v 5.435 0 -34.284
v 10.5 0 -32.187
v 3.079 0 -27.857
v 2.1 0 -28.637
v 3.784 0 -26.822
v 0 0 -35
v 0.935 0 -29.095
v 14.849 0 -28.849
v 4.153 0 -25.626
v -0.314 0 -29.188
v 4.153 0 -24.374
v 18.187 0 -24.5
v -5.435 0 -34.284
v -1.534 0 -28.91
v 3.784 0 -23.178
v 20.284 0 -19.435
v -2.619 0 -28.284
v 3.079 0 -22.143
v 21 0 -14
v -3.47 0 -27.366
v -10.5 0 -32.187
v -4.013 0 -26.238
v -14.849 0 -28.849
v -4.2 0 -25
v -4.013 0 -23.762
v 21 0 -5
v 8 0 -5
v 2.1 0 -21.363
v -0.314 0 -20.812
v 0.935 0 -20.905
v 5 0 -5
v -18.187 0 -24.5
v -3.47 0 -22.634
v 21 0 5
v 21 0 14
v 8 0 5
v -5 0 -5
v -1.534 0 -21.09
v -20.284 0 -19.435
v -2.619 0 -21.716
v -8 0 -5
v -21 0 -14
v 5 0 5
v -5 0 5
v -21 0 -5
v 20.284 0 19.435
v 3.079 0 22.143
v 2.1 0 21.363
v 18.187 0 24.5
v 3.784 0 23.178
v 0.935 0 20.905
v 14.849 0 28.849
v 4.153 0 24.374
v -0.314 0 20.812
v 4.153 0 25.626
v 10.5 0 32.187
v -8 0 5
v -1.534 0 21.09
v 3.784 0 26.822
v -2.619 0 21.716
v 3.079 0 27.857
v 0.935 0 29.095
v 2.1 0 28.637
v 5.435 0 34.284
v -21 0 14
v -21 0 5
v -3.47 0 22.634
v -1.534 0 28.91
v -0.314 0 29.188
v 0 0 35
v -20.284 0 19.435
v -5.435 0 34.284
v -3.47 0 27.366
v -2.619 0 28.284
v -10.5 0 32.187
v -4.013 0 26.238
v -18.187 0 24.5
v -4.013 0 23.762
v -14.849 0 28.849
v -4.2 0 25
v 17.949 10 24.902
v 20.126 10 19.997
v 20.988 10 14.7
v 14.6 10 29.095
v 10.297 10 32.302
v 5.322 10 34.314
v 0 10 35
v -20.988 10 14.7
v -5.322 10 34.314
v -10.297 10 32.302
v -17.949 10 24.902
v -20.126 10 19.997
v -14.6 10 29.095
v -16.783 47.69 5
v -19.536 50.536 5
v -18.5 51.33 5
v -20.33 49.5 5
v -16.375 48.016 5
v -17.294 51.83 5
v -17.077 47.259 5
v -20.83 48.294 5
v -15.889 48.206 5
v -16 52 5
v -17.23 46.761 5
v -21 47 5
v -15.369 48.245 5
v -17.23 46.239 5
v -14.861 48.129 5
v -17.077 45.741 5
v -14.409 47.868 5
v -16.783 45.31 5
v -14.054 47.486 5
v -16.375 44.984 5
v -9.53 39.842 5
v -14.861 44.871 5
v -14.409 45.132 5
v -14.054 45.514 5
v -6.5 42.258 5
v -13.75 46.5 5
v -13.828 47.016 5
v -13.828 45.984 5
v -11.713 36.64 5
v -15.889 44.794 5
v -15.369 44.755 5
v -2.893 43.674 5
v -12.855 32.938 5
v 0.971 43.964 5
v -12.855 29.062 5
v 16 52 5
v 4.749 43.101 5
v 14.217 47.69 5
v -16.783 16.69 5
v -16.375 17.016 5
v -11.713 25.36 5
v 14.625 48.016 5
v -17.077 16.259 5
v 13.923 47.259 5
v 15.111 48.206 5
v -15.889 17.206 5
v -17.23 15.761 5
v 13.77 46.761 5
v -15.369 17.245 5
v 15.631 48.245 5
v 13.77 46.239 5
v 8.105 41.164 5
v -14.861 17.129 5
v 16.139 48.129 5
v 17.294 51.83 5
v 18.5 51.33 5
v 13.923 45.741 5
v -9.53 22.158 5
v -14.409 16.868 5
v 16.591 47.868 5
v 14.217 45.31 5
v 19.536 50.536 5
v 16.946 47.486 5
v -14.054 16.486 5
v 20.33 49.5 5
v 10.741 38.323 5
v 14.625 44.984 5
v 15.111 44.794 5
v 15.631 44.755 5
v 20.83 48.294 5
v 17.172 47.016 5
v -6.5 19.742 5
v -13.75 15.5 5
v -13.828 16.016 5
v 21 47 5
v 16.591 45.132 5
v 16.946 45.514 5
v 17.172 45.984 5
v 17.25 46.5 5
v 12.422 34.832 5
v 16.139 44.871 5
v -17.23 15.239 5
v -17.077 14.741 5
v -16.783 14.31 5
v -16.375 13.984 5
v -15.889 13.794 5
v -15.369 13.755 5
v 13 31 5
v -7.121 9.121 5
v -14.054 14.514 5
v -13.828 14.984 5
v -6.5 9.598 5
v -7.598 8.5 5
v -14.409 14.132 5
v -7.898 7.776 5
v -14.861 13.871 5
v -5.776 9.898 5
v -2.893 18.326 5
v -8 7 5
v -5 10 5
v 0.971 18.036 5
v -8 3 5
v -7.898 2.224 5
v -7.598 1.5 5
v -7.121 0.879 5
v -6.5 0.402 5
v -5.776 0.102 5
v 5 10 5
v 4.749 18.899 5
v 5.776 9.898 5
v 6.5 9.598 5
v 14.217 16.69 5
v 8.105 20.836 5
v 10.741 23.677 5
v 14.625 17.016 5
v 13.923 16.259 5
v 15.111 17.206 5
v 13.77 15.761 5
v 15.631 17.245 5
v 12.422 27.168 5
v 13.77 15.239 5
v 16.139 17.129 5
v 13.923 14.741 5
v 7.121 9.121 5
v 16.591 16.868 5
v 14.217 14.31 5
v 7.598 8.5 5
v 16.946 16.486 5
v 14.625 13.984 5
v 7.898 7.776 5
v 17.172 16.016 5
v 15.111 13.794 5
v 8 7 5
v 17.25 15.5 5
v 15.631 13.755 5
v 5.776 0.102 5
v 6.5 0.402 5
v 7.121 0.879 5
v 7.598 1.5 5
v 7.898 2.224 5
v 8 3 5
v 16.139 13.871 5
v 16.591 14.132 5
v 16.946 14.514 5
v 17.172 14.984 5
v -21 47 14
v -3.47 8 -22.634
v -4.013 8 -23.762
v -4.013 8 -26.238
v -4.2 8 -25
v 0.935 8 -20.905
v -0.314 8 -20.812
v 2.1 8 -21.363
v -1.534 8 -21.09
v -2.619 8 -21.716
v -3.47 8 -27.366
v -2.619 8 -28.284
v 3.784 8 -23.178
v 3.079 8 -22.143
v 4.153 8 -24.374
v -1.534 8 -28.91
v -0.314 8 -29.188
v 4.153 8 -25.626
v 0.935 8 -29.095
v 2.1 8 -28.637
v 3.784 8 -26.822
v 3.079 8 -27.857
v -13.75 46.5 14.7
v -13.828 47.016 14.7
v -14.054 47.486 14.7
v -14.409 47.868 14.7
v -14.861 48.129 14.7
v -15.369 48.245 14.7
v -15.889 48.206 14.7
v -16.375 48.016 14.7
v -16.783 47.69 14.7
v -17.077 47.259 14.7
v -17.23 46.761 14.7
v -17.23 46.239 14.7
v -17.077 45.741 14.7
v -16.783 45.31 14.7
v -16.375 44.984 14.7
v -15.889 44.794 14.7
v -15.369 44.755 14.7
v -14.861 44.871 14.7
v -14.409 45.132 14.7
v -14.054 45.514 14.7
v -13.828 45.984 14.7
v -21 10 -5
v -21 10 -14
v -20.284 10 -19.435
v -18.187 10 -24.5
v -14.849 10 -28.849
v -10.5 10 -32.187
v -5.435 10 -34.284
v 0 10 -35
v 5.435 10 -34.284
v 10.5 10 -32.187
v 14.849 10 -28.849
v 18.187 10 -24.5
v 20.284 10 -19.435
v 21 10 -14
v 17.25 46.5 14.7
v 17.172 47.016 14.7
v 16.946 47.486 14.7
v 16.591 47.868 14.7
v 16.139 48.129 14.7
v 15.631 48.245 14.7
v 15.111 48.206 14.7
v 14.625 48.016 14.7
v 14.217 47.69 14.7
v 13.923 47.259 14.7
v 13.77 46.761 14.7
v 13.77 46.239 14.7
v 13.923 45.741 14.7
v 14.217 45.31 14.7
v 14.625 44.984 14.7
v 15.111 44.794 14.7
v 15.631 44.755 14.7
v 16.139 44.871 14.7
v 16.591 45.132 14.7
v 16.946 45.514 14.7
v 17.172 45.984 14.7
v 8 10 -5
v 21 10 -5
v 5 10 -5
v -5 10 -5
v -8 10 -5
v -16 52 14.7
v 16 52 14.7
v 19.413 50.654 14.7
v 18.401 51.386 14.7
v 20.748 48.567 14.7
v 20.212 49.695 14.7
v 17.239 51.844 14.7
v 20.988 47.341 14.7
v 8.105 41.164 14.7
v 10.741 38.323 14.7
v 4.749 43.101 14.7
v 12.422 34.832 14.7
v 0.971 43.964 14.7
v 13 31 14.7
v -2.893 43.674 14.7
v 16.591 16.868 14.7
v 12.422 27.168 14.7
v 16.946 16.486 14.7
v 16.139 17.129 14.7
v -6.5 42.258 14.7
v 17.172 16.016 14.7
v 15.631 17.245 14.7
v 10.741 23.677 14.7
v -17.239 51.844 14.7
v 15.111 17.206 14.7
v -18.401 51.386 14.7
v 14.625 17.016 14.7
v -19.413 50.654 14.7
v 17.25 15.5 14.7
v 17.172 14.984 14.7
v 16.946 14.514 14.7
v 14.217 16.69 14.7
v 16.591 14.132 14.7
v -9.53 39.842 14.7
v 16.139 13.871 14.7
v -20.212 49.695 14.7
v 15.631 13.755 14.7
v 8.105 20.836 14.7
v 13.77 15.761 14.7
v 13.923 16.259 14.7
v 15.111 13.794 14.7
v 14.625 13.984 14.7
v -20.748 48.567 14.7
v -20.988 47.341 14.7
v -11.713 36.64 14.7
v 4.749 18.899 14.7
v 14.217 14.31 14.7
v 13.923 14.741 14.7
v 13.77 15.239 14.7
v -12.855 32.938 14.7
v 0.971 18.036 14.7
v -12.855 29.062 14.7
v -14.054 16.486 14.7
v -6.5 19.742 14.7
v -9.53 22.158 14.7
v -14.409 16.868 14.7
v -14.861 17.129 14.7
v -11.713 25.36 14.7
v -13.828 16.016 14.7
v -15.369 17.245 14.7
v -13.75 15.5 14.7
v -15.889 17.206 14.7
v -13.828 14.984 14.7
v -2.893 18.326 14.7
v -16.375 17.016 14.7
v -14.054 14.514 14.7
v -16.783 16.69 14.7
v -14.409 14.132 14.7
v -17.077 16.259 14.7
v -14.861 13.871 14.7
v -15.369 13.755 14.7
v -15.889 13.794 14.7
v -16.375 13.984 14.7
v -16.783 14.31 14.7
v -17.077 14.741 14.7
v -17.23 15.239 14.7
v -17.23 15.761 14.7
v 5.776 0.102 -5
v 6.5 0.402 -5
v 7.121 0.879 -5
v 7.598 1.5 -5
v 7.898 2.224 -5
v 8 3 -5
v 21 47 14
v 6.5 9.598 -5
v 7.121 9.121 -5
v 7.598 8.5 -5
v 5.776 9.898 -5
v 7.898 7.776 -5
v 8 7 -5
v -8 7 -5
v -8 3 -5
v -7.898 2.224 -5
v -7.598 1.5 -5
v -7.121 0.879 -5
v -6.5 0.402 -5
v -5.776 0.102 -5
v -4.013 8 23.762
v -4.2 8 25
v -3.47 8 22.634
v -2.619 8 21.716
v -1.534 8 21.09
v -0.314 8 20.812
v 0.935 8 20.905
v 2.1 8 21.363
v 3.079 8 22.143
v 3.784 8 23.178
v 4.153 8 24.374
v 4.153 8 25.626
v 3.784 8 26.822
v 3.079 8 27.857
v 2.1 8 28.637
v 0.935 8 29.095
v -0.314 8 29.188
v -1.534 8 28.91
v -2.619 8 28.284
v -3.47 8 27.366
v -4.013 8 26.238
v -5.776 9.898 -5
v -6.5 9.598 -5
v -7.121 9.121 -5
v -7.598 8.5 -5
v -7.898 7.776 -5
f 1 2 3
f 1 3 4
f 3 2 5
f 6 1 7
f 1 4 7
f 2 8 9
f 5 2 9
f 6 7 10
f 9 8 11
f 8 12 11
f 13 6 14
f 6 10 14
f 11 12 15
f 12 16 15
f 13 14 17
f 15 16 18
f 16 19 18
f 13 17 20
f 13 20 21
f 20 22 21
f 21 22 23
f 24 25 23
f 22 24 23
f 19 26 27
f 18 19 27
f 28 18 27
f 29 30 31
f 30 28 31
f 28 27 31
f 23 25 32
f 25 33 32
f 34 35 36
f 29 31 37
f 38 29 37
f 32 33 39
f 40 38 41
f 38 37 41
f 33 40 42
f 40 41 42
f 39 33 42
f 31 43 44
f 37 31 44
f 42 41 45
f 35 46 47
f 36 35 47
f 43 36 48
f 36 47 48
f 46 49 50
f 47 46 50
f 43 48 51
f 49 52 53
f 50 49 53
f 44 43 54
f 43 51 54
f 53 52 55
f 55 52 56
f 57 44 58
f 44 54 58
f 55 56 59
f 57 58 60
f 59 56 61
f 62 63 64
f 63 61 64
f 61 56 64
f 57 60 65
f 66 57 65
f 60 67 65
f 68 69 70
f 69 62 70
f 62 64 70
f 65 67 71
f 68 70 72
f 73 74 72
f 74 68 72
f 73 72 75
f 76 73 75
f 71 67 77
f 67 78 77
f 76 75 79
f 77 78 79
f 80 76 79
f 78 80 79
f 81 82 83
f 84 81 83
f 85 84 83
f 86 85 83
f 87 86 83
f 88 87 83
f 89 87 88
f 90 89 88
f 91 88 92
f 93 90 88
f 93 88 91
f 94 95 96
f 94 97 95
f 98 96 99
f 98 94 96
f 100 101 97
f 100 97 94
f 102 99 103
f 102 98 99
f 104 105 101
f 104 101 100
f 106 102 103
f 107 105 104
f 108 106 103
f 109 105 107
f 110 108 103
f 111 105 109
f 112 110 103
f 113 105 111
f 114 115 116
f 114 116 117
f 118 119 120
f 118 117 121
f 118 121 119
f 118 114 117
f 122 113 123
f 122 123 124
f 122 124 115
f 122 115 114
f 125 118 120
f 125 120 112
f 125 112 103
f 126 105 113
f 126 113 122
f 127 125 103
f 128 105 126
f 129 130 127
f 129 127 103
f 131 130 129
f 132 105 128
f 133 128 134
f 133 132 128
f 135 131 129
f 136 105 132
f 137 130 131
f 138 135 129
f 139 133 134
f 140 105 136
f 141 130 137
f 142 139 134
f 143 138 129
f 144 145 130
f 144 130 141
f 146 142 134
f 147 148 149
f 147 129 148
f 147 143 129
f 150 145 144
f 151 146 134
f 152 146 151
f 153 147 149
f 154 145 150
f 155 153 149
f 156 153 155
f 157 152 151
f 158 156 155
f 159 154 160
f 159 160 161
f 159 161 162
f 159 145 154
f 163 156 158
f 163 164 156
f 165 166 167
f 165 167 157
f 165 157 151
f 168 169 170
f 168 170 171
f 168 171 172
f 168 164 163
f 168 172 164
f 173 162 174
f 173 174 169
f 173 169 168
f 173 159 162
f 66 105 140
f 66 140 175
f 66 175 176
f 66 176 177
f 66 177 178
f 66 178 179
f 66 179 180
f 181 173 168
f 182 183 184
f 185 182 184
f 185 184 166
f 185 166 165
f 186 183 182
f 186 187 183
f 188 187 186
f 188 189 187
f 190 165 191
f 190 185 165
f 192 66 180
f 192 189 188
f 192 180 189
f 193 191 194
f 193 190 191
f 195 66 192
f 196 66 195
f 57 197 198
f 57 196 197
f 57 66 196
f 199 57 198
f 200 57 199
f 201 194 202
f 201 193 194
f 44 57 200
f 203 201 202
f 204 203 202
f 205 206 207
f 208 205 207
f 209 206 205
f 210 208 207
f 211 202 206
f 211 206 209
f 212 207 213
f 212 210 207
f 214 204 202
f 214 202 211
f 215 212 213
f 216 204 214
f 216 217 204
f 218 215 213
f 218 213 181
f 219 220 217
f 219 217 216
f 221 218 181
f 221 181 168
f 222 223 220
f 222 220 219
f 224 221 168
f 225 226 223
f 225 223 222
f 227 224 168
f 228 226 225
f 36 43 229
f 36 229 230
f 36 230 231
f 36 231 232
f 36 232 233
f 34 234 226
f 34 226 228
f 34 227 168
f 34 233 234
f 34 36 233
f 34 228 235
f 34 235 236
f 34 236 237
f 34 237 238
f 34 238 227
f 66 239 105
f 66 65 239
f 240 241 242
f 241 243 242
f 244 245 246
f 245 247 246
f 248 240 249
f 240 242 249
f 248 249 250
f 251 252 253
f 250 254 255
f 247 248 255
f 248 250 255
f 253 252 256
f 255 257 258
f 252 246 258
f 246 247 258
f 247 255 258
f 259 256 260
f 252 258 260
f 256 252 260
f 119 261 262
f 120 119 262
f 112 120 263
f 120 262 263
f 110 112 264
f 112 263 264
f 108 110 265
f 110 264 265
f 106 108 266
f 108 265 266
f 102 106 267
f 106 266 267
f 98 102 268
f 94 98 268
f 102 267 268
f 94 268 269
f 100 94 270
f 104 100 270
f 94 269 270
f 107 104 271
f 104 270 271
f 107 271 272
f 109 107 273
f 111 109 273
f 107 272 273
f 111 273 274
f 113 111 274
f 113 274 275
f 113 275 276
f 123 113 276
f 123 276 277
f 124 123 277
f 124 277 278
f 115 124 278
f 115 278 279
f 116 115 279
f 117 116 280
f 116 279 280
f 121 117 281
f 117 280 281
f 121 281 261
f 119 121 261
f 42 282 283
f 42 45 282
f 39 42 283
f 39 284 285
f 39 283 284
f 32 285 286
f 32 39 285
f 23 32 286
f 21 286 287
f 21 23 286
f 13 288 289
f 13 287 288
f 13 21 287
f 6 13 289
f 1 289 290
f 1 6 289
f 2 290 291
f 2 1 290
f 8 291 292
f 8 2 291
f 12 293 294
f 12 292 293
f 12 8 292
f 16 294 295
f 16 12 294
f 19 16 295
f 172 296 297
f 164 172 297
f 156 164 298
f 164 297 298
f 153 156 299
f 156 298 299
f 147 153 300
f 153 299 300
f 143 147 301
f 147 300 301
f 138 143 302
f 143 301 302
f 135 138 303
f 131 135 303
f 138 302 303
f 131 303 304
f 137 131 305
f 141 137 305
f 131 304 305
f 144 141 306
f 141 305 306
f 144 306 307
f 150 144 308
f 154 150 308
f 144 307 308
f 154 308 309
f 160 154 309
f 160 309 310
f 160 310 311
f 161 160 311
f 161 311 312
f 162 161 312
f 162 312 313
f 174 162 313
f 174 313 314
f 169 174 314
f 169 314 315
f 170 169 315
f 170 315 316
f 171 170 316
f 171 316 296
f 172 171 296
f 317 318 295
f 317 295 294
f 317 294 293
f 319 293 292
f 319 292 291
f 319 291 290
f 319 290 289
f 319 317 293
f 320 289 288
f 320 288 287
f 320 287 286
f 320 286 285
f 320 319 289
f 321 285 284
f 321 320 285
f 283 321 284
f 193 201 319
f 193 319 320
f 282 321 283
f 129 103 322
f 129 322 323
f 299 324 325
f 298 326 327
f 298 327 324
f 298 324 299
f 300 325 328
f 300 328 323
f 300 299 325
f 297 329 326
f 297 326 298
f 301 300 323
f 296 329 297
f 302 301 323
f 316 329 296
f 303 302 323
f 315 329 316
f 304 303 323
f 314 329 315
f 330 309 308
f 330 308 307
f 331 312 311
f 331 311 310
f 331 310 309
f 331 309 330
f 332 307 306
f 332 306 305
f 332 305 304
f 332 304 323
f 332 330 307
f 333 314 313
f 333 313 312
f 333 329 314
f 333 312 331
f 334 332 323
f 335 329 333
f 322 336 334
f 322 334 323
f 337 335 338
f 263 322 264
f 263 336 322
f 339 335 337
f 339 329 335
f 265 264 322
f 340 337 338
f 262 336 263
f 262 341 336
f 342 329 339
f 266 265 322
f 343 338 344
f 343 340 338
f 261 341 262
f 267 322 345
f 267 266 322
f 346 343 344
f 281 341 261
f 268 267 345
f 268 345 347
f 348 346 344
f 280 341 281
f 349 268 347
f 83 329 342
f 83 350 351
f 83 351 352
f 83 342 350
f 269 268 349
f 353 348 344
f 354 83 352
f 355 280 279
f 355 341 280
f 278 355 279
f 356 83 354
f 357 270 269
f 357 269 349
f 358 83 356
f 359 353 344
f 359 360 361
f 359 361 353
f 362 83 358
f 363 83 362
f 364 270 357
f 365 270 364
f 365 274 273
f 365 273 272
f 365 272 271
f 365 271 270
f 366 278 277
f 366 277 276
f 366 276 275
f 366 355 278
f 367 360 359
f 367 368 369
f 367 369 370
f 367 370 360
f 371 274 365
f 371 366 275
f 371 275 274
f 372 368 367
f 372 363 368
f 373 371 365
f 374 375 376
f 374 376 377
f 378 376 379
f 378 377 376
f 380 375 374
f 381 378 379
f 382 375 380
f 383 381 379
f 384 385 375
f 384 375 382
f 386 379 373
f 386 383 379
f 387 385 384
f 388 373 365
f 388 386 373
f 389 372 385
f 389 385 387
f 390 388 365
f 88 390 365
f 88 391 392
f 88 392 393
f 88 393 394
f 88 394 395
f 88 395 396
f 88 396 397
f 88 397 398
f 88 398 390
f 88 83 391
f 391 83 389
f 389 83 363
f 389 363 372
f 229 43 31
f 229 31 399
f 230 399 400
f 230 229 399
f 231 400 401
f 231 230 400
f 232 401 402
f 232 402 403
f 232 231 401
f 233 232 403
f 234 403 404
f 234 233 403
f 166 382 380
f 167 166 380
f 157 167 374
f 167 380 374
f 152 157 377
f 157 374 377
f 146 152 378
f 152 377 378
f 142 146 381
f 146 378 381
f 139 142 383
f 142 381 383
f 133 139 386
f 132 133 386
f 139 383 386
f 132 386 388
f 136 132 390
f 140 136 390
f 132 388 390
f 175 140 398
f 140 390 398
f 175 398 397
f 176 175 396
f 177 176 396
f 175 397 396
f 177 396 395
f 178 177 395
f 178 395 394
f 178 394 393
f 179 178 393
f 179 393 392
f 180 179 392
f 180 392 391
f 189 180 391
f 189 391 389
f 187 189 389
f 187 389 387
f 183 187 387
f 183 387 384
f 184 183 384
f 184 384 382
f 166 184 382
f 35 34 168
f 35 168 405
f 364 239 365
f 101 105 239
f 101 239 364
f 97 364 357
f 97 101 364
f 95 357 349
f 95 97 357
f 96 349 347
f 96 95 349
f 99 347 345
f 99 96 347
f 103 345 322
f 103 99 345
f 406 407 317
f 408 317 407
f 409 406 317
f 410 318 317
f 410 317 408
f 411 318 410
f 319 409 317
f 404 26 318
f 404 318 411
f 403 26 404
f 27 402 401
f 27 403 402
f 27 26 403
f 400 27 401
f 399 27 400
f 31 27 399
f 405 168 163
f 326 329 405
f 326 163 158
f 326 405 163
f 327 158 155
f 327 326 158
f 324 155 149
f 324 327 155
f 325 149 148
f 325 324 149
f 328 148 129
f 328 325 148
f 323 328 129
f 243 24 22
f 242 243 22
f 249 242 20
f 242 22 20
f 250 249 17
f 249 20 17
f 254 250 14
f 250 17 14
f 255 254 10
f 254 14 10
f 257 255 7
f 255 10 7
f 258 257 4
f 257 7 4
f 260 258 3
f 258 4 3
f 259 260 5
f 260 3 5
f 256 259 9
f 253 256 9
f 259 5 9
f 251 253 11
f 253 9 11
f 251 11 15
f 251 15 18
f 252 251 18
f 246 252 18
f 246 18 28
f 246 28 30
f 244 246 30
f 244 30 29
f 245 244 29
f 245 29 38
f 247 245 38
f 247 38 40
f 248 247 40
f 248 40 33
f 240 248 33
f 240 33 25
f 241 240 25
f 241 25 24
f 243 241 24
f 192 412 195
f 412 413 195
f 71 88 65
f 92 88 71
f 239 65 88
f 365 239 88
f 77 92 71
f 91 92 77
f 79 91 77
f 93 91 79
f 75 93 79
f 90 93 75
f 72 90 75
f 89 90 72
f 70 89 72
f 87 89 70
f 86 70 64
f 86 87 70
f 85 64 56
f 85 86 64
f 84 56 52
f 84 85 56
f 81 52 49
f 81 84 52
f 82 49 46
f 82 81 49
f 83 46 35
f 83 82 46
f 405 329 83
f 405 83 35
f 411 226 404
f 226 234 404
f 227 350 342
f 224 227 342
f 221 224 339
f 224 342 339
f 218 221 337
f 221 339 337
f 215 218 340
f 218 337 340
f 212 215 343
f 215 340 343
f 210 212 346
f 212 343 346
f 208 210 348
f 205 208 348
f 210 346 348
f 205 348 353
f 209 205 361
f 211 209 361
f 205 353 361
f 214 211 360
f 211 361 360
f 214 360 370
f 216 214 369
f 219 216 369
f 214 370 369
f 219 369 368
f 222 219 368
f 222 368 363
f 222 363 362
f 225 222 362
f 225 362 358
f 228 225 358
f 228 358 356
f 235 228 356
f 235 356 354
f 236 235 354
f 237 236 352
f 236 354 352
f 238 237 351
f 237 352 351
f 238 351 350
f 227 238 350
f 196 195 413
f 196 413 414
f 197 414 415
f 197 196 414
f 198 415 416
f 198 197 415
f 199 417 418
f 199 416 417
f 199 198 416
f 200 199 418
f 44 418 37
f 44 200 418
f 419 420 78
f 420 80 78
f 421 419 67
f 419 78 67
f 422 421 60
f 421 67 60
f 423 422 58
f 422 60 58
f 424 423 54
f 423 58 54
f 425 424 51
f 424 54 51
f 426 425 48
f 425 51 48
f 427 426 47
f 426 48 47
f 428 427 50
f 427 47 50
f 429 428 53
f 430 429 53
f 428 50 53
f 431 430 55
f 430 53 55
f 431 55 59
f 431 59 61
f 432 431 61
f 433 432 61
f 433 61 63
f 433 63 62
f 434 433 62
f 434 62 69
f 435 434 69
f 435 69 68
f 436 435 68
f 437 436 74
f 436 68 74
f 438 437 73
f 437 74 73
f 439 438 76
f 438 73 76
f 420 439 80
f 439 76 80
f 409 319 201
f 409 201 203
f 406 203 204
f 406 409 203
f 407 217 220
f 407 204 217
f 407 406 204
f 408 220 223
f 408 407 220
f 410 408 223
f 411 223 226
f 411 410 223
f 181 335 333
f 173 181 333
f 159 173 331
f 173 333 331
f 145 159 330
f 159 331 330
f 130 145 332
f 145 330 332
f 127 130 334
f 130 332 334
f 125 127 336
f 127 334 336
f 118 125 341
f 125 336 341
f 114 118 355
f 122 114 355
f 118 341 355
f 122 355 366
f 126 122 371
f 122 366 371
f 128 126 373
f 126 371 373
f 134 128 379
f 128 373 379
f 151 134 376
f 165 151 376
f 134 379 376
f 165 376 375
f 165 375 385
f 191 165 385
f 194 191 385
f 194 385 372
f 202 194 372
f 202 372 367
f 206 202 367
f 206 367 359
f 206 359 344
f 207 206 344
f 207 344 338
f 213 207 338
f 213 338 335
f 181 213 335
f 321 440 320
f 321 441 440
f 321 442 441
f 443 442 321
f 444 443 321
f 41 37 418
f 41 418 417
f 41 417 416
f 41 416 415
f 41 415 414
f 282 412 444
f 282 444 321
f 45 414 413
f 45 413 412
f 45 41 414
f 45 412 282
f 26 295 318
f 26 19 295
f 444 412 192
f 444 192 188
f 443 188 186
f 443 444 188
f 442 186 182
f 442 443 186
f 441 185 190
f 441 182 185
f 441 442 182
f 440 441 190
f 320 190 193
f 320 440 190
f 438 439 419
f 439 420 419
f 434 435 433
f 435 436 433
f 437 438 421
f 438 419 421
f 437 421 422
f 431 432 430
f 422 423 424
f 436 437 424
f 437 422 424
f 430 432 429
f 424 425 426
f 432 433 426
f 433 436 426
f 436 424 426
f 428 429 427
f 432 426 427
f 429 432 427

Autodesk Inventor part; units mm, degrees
ref_plane "YZ Plane" through (0, 0, 0) normal (1, 0, 0) x (0, 1, 0)
ref_plane "XZ Plane" through (0, 0, 0) normal (0, 1, 0) x (-1, 0, 0)
ref_plane "XY Plane" through (0, 0, 0) normal (0, 0, 1) x (1, 0, 0)
sketch "Esquisse1" plane through (0, 0, 0) normal (0, 1, 0) x (-1, 0, 0)
  circle A0 centre (0, 25) radius 4.2
  line L0 (16, 0) -> (-13, 0)
  circle A1 centre (0, -25) radius 4.2
  line L1 (21, 5) -> (-21, 5)
  line L2 (-21, 5) -> (-21, -5)
  line L3 (-21, -5) -> (21, -5)
  line L4 (21, -5) -> (21, 5)
  line L5 (21, 5) -> (-21, -5)
  line L6 (-21, 5) -> (21, -5)
  line L7 (8, 5) -> (-8, 5)
  line L8 (-8, 5) -> (-8, -5)
  line L9 (-8, -5) -> (8, -5)
  line L10 (8, -5) -> (8, 5)
  line L11 (8, 5) -> (-8, -5)
  line L12 (-8, 5) -> (8, -5)
  line L13 (21, 5) -> (21, 35)
  line L14 (-21, 35) -> (-21, 5)
  line L15 (21, 35) -> (-21, 35)
  line L16 (21, -5) -> (21, -35)
  line L17 (-21, -35) -> (-21, -5)
  line L18 (21, -35) -> (-21, -35)
  point P0 (0, 0)
  point P1 (0, 0)
  point P2 (0, 0)
  point P3 (8, -5)
  point P4 (-8, 5)
  dimension "d0" = 8.4
  dimension "d1" = 25
  dimension "d2" = 42
  dimension "d3" = 10
  dimension "d4" = 16
extrude "Extrusion1" add sketch "Esquisse1" along normal blind 10 contours L10 L6 L0 | L0 L5 L10 | L5 L8 L0 | L11 L10 L5 | L11 L8 L5 | L0 L8 L6 | L12 L1 L11 | L12 L3 L11 | L6 L8 L12 | L6 L10 L12 | L1 L14 L15 L13 | L3 L16 L18 L17
sketch "Esquisse2" plane through (0, 10, 0) normal (0, 1, 0) x (1, 0, 0)
  line L0 (-8, -5) -> (-21, -5) projected
  line L1 (-21, -5) -> (21, -5)
  line L2 (21, -5) -> (21, -14.7)
  line L3 (21, -14.7) -> (-21, -14.7)
  line L4 (-21, -14.7) -> (-21, -5)
  point P0 (0, 0)
  dimension "d8" = 9.7
  dimension "d9" = 42
extrude "Extrusion2" add sketch "Esquisse2" along normal blind 42
sketch "Esquisse3" plane through (0, 10, 0) normal (0, 1, 0) x (1, 0, 0)
  line L0 (21, -14.7) -> (-21, -14.7) projected
  line L1 (-21, -35) -> (21, -35)
  line L2 (21, -35) -> (21, -14.7)
  line L3 (21, -14.7) -> (-21, -14.7)
  line L4 (-21, -14.7) -> (-21, -35)
  line L5 (21, 35) -> (-21, 35) projected
  line L6 (-21, 5) -> (21, 5)
  line L7 (21, 5) -> (21, 35)
  line L8 (21, 35) -> (-21, 35)
  line L9 (-21, 35) -> (-21, 5)
  point P0 (0, 0)
  point P1 (-21, -14.7)
extrude "Extrusion3" add sketch "Esquisse3" against normal blind 2
sketch "Esquisse4" plane through (-21, 10, 14.7) normal (0, 0, 1) x (1, 0, 0)
  line L0 (42, 42) -> (0, 42) projected
  line L1 (42, 0) -> (0, 0)
  line L2 (0, 0) -> (42, 42)
  circle A0 centre (21, 21) radius 13
  line L3 (5.5, 5.5) -> (36.5, 5.5)
  line L4 (36.5, 5.5) -> (36.5, 36.5)
  line L5 (36.5, 36.5) -> (5.5, 36.5)
  line L6 (5.5, 36.5) -> (5.5, 5.5)
  line L7 (5.5, 36.5) -> (36.5, 5.5)
  circle A1 centre (5.5, 36.5) radius 1.75
  circle A2 centre (5.5, 5.5) radius 1.75
  line L8 (21, 36.5) -> (21, 5.5)
  circle A3 centre (36.5, 36.5) radius 1.75
  circle A4 centre (36.5, 5.5) radius 1.75
  point P0 (21, -10)
  point P1 (36.5, 5.5)
  dimension "d14" = 26
  dimension "d20" = 31
  dimension "d21" = 3.5
  dimension "d22" = 3.5
extrude "Extrusion4" cut sketch "Esquisse4" against normal blind 10 contours A2 L6 L2 | L2 L3 A2 | L6 A2 L2 | L2 A2 L3 | A1 L5 L6 | L6 L7 A1 | A0 L7 L2 | L2 L8 A0 | L5 A1 L7 | A4 L7 L3 | L3 L4 A4 | L8 L7 A0 | L8 A0 L2 | L2 A0 L7 | L7 A0 L8 | L7 A4 L4 | A3 L2 L5 | L5 L2 A3 | L2 L4 A3 | L2 A3 L4
fillet "Congé1" radius 5 2 edges at (21, 52, 9.85) (-21, 52, 9.85)
fillet "Congé2" radius 21 4 edges at (21, 5, -35) (-21, 5, -35) (21, 5, 35) (-21, 5, 35)
fillet "Congé3" radius 3 4 edges at (-8, 10, 0) (-8, 0, 0) (8, 0, 0) (8, 10, 0)
properties part number "tete_v2"
